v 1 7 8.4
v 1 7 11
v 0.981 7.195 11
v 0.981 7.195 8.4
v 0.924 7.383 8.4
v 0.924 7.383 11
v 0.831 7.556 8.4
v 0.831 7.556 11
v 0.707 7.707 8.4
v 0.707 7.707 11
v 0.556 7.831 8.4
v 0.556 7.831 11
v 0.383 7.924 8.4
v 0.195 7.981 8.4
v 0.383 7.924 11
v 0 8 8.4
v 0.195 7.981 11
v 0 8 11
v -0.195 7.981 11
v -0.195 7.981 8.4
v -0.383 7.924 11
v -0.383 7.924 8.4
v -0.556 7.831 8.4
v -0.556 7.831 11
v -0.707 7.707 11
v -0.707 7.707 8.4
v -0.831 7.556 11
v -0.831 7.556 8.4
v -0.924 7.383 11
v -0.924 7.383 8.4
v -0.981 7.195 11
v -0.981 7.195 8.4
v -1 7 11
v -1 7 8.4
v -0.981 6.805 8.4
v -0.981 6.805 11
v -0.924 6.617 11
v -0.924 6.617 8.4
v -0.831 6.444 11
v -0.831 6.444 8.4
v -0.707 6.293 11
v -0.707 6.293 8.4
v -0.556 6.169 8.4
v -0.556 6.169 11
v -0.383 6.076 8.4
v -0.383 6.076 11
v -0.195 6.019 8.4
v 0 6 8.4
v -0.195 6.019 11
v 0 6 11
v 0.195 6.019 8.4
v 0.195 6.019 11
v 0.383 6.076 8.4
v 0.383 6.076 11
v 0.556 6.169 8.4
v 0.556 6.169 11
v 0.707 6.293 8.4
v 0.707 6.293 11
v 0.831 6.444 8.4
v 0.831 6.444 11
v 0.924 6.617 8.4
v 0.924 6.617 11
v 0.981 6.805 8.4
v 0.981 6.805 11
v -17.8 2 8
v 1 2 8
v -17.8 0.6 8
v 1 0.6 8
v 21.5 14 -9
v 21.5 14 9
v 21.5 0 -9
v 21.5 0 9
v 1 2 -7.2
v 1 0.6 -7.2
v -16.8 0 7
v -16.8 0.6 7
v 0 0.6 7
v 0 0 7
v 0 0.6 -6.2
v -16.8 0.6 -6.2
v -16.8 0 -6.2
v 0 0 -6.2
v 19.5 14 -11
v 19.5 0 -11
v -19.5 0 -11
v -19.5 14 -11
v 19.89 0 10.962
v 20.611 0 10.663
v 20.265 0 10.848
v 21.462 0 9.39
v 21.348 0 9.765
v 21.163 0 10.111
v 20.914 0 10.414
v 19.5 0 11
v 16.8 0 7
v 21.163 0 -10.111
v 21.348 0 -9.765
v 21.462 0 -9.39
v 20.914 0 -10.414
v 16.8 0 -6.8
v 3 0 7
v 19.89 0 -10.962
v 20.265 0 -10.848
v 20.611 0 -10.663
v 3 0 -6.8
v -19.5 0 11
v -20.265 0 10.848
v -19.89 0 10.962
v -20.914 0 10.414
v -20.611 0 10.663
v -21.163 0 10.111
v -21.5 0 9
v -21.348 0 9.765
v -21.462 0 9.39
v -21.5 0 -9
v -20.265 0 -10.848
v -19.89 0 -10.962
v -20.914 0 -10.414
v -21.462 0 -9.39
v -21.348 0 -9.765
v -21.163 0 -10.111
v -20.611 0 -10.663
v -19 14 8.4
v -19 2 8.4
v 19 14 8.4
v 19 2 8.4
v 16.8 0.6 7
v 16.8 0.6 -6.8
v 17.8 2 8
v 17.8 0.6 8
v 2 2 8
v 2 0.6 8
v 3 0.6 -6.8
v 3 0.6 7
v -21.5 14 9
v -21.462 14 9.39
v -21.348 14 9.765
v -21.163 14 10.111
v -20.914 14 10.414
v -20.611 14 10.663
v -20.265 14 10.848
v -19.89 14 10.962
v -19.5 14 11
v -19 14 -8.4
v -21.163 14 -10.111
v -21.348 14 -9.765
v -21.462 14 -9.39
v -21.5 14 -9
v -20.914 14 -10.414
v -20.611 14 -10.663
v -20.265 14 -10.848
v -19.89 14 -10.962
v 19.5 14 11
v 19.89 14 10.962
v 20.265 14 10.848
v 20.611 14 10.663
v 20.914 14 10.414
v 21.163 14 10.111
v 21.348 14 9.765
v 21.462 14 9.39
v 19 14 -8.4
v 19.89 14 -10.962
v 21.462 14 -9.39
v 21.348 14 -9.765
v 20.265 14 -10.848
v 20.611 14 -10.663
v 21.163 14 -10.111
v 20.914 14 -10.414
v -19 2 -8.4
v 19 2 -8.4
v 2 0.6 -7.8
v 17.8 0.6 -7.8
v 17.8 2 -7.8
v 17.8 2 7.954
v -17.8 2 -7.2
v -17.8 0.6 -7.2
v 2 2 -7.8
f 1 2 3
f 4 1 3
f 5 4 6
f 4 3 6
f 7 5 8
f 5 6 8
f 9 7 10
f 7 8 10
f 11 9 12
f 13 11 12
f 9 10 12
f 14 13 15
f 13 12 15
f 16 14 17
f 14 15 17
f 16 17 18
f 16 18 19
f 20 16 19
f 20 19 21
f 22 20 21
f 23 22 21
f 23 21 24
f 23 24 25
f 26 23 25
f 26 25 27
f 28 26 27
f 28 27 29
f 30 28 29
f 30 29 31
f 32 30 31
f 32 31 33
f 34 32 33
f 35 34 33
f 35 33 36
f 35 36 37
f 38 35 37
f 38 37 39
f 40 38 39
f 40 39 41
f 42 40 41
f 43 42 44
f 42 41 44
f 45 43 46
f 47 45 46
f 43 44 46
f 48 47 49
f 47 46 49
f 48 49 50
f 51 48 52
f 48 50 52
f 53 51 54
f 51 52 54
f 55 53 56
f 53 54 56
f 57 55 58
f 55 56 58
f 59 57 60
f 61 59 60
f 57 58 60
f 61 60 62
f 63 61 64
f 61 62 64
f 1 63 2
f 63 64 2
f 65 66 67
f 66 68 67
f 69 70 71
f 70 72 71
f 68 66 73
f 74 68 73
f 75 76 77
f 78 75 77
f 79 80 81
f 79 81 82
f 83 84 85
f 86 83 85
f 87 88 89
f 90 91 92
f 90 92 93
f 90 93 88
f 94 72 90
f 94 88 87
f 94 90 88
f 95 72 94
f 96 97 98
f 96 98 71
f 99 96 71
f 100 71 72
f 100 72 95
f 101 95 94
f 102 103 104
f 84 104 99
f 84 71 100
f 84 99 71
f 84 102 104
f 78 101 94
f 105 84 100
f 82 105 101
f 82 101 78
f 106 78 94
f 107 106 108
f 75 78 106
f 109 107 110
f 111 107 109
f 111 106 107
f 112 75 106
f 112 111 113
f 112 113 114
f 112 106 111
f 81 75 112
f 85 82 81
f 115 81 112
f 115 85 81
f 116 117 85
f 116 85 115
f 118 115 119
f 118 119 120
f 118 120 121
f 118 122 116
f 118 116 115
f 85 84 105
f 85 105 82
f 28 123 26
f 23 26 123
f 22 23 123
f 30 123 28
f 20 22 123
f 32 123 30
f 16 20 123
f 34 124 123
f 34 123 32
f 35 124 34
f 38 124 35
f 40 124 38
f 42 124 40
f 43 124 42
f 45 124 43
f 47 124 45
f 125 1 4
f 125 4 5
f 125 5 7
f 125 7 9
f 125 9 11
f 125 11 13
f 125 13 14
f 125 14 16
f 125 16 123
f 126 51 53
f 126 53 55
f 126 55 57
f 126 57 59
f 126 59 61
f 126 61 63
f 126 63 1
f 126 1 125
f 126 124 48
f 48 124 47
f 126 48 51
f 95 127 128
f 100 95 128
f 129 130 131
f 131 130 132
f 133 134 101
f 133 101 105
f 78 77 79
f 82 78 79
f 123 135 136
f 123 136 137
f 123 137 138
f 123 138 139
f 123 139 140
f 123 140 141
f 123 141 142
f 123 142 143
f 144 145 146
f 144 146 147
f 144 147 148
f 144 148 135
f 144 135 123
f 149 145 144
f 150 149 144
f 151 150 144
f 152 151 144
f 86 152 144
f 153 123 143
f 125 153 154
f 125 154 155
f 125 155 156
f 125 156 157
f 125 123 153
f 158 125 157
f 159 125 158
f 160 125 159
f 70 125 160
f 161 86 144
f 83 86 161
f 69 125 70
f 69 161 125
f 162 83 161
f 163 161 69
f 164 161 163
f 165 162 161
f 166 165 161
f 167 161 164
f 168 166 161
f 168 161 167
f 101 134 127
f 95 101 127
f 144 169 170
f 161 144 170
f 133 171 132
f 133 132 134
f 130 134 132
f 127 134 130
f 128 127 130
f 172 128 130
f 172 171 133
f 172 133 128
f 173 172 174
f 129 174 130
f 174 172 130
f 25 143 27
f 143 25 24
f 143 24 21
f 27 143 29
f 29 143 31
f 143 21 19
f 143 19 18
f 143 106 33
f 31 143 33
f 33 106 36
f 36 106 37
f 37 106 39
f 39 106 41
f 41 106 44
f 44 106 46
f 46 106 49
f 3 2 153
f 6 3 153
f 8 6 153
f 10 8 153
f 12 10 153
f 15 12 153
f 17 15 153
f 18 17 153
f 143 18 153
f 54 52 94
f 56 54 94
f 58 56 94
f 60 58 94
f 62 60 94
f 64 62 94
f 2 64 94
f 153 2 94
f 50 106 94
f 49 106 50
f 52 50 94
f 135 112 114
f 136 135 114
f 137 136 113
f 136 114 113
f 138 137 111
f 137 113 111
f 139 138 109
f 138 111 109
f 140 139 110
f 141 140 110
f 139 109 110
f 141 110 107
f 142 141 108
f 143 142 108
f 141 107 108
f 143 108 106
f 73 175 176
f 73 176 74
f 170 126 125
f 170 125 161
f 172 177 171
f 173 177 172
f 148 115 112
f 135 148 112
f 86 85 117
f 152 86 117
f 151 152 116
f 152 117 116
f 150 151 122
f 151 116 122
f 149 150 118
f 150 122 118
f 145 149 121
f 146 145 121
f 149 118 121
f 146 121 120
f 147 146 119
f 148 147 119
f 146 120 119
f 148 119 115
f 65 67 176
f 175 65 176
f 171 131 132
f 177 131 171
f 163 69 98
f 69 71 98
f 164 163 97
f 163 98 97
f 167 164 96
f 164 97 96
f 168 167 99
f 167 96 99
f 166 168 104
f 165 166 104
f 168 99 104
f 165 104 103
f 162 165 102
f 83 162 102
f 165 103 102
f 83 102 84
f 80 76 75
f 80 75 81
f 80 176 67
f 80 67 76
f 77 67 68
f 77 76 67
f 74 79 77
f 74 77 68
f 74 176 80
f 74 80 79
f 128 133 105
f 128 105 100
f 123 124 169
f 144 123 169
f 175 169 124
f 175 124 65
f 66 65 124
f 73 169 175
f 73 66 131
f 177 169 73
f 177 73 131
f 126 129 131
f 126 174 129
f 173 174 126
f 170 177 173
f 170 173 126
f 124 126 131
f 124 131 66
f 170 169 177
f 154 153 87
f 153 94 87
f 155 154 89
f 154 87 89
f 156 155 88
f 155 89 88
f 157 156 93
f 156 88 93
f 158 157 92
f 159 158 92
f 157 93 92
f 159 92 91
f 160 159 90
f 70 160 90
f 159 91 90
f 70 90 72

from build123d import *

# Parameters (mm, degrees)
BOSS_EXTRUDE1_DEPTH = 2
SKETCH2_W           = 18.8
SKETCH2_H           = 15.2
SKETCH2_W_2         = 15.8
SKETCH2_H_2         = 15.8
CUT_EXTRUDE1_DEPTH  = 1.4
SKETCH3_W           = 16.8
SKETCH3_H           = 13.2
SKETCH3_W_2         = 13.8
SKETCH3_H_2         = 13.8
CUT_EXTRUDE2_DEPTH  = 25.191114071
BOSS_EXTRUDE3_DEPTH = 12
FILLET1_R           = 10
SKETCH15_W          = 38
SKETCH15_H          = 16.8
CUT_EXTRUDE3_DEPTH  = 27.96757312
CUT_EXTRUDE5_REACH  = 35.797
SKETCH17_R          = 1


with BuildPart() as part:
    # Sketch1 → Boss-Extrude1 (new body)
    with BuildSketch(Plane(origin=(0, 0, 0), x_dir=(1, 0, 0), z_dir=(0, 1, 0))):
        with BuildLine():
            Line((19.5, -11), (-19.5, -11))
            ThreePointArc((-19.5, -11), (-20.914213562, -10.414213562), (-21.5, -9))
            Line((-21.5, -9), (-21.5, 9))
            ThreePointArc((-21.5, 9), (-20.914213562, 10.414213562), (-19.5, 11))
            Line((-19.5, 11), (19.5, 11))
            ThreePointArc((19.5, 11), (20.914213562, 10.414213562), (21.5, 9))
            Line((21.5, 9), (21.5, -9))
            ThreePointArc((21.5, -9), (20.914213562, -10.414213562), (19.5, -11))
        make_face()
    extrude(amount=BOSS_EXTRUDE1_DEPTH)

    # Sketch2 → Cut-Extrude1 (cut)
    with BuildSketch(Plane(origin=(0, 2, 0), x_dir=(1, 0, 0), z_dir=(0, 1, 0))):
        with Locations((-8.4, -0.4)):
            Rectangle(SKETCH2_W, SKETCH2_H)
        with Locations((9.9, -0.1)):
            Rectangle(SKETCH2_W_2, SKETCH2_H_2)
    extrude(amount=-CUT_EXTRUDE1_DEPTH, mode=Mode.SUBTRACT)

    # Sketch3 → Cut-Extrude2 (cut, through all)
    with BuildSketch(Plane(origin=(0, 0.6, 0), x_dir=(1, 0, 0), z_dir=(0, 1, 0))):
        with Locations((-8.4, -0.4)):
            Rectangle(SKETCH3_W, SKETCH3_H)
        with Locations((9.9, -0.1)):
            Rectangle(SKETCH3_W_2, SKETCH3_H_2)
    extrude(amount=-CUT_EXTRUDE2_DEPTH, mode=Mode.SUBTRACT)

    # Sketch13 → Boss-Extrude3 (add)
    with BuildSketch(Plane(origin=(0, 2, 0), x_dir=(1, 0, 0), z_dir=(0, 1, 0))):
        with BuildLine():
            ThreePointArc((-21.5, -9), (-20.914213562, -10.414213562), (-19.5, -11))
            Line((-19.5, -11), (19.5, -11))
            ThreePointArc((19.5, -11), (20.914213562, -10.414213562), (21.5, -9))
            Line((21.5, -9), (21.5, 9))
            ThreePointArc((21.5, 9), (20.914213562, 10.414213562), (19.5, 11))
            Line((19.5, 11), (-19.5, 11))
            ThreePointArc((-19.5, 11), (-20.914213562, 10.414213562), (-21.5, 9))
            Line((-21.5, 9), (-21.5, -9))
        make_face()
        with BuildLine():
            ThreePointArc((17.5, 8), (18.207106781, 7.707106781), (18.5, 7))
            Line((18.5, 7), (18.5, -7))
            ThreePointArc((18.5, -7), (18.306225775, -7.591607978), (17.8, -7.953939201))
            Line((17.8, -7.953939201), (17.8, -8))
            Line((17.8, -8), (-17.8, -8))
            Line((-17.8, -8), (-17.8, -7.953939201))
            ThreePointArc((-17.8, -7.953939201), (-18.306225775, -7.591607978), (-18.5, -7))
            Line((-18.5, -7), (-18.5, 7))
            ThreePointArc((-18.5, 7), (-18.207106781, 7.707106781), (-17.5, 8))
            Line((-17.5, 8), (17.5, 8))
        make_face(mode=Mode.SUBTRACT)
    extrude(amount=BOSS_EXTRUDE3_DEPTH)

    # Fillet1
    # the kernel refuses this fillet: 10 mm, written as the material it takes off along each edge
    with BuildSketch(Plane(origin=(17.8, 2, 7.953939201), x_dir=(0.906100611464274, 0, -0.42306226717123885), z_dir=(0, 1, 0))) as fillet1_piece_1:
        with BuildLine():
            CenterArc((1.580945974, -9.912835739), FILLET1_R, 97.570469618, 1.638937345)
            Line((-0.019486586, -0.041735718), (0, 0))
            ThreePointArc((0, 0), (0.131745498, -0.008716426), (0.263490996, 0))
        make_face()
    extrude(amount=12.658727489, mode=Mode.SUBTRACT)

    # Sketch15 → Cut-Extrude3 (cut, through all)
    with BuildSketch(Plane(origin=(0, 2, 0), x_dir=(1, 0, 0), z_dir=(0, 1, 0))):
        Rectangle(SKETCH15_W, SKETCH15_H)
    extrude(amount=CUT_EXTRUDE3_DEPTH, mode=Mode.SUBTRACT)

    # Sketch17 → Cut-Extrude5 (cut, up to next)
    with BuildSketch(Plane.XY.offset(11), mode=Mode.PRIVATE) as cut_extrude5_sk1:
        with Locations((0, 7)):
            Circle(SKETCH17_R)
    cut_extrude5_tool1 = extrude(cut_extrude5_sk1.sketch, amount=-CUT_EXTRUDE5_REACH, mode=Mode.PRIVATE) & part.part
    add(cut_extrude5_tool1.solids().sort_by_distance((0, 7, 11))[0], mode=Mode.SUBTRACT)


solid = part.part
